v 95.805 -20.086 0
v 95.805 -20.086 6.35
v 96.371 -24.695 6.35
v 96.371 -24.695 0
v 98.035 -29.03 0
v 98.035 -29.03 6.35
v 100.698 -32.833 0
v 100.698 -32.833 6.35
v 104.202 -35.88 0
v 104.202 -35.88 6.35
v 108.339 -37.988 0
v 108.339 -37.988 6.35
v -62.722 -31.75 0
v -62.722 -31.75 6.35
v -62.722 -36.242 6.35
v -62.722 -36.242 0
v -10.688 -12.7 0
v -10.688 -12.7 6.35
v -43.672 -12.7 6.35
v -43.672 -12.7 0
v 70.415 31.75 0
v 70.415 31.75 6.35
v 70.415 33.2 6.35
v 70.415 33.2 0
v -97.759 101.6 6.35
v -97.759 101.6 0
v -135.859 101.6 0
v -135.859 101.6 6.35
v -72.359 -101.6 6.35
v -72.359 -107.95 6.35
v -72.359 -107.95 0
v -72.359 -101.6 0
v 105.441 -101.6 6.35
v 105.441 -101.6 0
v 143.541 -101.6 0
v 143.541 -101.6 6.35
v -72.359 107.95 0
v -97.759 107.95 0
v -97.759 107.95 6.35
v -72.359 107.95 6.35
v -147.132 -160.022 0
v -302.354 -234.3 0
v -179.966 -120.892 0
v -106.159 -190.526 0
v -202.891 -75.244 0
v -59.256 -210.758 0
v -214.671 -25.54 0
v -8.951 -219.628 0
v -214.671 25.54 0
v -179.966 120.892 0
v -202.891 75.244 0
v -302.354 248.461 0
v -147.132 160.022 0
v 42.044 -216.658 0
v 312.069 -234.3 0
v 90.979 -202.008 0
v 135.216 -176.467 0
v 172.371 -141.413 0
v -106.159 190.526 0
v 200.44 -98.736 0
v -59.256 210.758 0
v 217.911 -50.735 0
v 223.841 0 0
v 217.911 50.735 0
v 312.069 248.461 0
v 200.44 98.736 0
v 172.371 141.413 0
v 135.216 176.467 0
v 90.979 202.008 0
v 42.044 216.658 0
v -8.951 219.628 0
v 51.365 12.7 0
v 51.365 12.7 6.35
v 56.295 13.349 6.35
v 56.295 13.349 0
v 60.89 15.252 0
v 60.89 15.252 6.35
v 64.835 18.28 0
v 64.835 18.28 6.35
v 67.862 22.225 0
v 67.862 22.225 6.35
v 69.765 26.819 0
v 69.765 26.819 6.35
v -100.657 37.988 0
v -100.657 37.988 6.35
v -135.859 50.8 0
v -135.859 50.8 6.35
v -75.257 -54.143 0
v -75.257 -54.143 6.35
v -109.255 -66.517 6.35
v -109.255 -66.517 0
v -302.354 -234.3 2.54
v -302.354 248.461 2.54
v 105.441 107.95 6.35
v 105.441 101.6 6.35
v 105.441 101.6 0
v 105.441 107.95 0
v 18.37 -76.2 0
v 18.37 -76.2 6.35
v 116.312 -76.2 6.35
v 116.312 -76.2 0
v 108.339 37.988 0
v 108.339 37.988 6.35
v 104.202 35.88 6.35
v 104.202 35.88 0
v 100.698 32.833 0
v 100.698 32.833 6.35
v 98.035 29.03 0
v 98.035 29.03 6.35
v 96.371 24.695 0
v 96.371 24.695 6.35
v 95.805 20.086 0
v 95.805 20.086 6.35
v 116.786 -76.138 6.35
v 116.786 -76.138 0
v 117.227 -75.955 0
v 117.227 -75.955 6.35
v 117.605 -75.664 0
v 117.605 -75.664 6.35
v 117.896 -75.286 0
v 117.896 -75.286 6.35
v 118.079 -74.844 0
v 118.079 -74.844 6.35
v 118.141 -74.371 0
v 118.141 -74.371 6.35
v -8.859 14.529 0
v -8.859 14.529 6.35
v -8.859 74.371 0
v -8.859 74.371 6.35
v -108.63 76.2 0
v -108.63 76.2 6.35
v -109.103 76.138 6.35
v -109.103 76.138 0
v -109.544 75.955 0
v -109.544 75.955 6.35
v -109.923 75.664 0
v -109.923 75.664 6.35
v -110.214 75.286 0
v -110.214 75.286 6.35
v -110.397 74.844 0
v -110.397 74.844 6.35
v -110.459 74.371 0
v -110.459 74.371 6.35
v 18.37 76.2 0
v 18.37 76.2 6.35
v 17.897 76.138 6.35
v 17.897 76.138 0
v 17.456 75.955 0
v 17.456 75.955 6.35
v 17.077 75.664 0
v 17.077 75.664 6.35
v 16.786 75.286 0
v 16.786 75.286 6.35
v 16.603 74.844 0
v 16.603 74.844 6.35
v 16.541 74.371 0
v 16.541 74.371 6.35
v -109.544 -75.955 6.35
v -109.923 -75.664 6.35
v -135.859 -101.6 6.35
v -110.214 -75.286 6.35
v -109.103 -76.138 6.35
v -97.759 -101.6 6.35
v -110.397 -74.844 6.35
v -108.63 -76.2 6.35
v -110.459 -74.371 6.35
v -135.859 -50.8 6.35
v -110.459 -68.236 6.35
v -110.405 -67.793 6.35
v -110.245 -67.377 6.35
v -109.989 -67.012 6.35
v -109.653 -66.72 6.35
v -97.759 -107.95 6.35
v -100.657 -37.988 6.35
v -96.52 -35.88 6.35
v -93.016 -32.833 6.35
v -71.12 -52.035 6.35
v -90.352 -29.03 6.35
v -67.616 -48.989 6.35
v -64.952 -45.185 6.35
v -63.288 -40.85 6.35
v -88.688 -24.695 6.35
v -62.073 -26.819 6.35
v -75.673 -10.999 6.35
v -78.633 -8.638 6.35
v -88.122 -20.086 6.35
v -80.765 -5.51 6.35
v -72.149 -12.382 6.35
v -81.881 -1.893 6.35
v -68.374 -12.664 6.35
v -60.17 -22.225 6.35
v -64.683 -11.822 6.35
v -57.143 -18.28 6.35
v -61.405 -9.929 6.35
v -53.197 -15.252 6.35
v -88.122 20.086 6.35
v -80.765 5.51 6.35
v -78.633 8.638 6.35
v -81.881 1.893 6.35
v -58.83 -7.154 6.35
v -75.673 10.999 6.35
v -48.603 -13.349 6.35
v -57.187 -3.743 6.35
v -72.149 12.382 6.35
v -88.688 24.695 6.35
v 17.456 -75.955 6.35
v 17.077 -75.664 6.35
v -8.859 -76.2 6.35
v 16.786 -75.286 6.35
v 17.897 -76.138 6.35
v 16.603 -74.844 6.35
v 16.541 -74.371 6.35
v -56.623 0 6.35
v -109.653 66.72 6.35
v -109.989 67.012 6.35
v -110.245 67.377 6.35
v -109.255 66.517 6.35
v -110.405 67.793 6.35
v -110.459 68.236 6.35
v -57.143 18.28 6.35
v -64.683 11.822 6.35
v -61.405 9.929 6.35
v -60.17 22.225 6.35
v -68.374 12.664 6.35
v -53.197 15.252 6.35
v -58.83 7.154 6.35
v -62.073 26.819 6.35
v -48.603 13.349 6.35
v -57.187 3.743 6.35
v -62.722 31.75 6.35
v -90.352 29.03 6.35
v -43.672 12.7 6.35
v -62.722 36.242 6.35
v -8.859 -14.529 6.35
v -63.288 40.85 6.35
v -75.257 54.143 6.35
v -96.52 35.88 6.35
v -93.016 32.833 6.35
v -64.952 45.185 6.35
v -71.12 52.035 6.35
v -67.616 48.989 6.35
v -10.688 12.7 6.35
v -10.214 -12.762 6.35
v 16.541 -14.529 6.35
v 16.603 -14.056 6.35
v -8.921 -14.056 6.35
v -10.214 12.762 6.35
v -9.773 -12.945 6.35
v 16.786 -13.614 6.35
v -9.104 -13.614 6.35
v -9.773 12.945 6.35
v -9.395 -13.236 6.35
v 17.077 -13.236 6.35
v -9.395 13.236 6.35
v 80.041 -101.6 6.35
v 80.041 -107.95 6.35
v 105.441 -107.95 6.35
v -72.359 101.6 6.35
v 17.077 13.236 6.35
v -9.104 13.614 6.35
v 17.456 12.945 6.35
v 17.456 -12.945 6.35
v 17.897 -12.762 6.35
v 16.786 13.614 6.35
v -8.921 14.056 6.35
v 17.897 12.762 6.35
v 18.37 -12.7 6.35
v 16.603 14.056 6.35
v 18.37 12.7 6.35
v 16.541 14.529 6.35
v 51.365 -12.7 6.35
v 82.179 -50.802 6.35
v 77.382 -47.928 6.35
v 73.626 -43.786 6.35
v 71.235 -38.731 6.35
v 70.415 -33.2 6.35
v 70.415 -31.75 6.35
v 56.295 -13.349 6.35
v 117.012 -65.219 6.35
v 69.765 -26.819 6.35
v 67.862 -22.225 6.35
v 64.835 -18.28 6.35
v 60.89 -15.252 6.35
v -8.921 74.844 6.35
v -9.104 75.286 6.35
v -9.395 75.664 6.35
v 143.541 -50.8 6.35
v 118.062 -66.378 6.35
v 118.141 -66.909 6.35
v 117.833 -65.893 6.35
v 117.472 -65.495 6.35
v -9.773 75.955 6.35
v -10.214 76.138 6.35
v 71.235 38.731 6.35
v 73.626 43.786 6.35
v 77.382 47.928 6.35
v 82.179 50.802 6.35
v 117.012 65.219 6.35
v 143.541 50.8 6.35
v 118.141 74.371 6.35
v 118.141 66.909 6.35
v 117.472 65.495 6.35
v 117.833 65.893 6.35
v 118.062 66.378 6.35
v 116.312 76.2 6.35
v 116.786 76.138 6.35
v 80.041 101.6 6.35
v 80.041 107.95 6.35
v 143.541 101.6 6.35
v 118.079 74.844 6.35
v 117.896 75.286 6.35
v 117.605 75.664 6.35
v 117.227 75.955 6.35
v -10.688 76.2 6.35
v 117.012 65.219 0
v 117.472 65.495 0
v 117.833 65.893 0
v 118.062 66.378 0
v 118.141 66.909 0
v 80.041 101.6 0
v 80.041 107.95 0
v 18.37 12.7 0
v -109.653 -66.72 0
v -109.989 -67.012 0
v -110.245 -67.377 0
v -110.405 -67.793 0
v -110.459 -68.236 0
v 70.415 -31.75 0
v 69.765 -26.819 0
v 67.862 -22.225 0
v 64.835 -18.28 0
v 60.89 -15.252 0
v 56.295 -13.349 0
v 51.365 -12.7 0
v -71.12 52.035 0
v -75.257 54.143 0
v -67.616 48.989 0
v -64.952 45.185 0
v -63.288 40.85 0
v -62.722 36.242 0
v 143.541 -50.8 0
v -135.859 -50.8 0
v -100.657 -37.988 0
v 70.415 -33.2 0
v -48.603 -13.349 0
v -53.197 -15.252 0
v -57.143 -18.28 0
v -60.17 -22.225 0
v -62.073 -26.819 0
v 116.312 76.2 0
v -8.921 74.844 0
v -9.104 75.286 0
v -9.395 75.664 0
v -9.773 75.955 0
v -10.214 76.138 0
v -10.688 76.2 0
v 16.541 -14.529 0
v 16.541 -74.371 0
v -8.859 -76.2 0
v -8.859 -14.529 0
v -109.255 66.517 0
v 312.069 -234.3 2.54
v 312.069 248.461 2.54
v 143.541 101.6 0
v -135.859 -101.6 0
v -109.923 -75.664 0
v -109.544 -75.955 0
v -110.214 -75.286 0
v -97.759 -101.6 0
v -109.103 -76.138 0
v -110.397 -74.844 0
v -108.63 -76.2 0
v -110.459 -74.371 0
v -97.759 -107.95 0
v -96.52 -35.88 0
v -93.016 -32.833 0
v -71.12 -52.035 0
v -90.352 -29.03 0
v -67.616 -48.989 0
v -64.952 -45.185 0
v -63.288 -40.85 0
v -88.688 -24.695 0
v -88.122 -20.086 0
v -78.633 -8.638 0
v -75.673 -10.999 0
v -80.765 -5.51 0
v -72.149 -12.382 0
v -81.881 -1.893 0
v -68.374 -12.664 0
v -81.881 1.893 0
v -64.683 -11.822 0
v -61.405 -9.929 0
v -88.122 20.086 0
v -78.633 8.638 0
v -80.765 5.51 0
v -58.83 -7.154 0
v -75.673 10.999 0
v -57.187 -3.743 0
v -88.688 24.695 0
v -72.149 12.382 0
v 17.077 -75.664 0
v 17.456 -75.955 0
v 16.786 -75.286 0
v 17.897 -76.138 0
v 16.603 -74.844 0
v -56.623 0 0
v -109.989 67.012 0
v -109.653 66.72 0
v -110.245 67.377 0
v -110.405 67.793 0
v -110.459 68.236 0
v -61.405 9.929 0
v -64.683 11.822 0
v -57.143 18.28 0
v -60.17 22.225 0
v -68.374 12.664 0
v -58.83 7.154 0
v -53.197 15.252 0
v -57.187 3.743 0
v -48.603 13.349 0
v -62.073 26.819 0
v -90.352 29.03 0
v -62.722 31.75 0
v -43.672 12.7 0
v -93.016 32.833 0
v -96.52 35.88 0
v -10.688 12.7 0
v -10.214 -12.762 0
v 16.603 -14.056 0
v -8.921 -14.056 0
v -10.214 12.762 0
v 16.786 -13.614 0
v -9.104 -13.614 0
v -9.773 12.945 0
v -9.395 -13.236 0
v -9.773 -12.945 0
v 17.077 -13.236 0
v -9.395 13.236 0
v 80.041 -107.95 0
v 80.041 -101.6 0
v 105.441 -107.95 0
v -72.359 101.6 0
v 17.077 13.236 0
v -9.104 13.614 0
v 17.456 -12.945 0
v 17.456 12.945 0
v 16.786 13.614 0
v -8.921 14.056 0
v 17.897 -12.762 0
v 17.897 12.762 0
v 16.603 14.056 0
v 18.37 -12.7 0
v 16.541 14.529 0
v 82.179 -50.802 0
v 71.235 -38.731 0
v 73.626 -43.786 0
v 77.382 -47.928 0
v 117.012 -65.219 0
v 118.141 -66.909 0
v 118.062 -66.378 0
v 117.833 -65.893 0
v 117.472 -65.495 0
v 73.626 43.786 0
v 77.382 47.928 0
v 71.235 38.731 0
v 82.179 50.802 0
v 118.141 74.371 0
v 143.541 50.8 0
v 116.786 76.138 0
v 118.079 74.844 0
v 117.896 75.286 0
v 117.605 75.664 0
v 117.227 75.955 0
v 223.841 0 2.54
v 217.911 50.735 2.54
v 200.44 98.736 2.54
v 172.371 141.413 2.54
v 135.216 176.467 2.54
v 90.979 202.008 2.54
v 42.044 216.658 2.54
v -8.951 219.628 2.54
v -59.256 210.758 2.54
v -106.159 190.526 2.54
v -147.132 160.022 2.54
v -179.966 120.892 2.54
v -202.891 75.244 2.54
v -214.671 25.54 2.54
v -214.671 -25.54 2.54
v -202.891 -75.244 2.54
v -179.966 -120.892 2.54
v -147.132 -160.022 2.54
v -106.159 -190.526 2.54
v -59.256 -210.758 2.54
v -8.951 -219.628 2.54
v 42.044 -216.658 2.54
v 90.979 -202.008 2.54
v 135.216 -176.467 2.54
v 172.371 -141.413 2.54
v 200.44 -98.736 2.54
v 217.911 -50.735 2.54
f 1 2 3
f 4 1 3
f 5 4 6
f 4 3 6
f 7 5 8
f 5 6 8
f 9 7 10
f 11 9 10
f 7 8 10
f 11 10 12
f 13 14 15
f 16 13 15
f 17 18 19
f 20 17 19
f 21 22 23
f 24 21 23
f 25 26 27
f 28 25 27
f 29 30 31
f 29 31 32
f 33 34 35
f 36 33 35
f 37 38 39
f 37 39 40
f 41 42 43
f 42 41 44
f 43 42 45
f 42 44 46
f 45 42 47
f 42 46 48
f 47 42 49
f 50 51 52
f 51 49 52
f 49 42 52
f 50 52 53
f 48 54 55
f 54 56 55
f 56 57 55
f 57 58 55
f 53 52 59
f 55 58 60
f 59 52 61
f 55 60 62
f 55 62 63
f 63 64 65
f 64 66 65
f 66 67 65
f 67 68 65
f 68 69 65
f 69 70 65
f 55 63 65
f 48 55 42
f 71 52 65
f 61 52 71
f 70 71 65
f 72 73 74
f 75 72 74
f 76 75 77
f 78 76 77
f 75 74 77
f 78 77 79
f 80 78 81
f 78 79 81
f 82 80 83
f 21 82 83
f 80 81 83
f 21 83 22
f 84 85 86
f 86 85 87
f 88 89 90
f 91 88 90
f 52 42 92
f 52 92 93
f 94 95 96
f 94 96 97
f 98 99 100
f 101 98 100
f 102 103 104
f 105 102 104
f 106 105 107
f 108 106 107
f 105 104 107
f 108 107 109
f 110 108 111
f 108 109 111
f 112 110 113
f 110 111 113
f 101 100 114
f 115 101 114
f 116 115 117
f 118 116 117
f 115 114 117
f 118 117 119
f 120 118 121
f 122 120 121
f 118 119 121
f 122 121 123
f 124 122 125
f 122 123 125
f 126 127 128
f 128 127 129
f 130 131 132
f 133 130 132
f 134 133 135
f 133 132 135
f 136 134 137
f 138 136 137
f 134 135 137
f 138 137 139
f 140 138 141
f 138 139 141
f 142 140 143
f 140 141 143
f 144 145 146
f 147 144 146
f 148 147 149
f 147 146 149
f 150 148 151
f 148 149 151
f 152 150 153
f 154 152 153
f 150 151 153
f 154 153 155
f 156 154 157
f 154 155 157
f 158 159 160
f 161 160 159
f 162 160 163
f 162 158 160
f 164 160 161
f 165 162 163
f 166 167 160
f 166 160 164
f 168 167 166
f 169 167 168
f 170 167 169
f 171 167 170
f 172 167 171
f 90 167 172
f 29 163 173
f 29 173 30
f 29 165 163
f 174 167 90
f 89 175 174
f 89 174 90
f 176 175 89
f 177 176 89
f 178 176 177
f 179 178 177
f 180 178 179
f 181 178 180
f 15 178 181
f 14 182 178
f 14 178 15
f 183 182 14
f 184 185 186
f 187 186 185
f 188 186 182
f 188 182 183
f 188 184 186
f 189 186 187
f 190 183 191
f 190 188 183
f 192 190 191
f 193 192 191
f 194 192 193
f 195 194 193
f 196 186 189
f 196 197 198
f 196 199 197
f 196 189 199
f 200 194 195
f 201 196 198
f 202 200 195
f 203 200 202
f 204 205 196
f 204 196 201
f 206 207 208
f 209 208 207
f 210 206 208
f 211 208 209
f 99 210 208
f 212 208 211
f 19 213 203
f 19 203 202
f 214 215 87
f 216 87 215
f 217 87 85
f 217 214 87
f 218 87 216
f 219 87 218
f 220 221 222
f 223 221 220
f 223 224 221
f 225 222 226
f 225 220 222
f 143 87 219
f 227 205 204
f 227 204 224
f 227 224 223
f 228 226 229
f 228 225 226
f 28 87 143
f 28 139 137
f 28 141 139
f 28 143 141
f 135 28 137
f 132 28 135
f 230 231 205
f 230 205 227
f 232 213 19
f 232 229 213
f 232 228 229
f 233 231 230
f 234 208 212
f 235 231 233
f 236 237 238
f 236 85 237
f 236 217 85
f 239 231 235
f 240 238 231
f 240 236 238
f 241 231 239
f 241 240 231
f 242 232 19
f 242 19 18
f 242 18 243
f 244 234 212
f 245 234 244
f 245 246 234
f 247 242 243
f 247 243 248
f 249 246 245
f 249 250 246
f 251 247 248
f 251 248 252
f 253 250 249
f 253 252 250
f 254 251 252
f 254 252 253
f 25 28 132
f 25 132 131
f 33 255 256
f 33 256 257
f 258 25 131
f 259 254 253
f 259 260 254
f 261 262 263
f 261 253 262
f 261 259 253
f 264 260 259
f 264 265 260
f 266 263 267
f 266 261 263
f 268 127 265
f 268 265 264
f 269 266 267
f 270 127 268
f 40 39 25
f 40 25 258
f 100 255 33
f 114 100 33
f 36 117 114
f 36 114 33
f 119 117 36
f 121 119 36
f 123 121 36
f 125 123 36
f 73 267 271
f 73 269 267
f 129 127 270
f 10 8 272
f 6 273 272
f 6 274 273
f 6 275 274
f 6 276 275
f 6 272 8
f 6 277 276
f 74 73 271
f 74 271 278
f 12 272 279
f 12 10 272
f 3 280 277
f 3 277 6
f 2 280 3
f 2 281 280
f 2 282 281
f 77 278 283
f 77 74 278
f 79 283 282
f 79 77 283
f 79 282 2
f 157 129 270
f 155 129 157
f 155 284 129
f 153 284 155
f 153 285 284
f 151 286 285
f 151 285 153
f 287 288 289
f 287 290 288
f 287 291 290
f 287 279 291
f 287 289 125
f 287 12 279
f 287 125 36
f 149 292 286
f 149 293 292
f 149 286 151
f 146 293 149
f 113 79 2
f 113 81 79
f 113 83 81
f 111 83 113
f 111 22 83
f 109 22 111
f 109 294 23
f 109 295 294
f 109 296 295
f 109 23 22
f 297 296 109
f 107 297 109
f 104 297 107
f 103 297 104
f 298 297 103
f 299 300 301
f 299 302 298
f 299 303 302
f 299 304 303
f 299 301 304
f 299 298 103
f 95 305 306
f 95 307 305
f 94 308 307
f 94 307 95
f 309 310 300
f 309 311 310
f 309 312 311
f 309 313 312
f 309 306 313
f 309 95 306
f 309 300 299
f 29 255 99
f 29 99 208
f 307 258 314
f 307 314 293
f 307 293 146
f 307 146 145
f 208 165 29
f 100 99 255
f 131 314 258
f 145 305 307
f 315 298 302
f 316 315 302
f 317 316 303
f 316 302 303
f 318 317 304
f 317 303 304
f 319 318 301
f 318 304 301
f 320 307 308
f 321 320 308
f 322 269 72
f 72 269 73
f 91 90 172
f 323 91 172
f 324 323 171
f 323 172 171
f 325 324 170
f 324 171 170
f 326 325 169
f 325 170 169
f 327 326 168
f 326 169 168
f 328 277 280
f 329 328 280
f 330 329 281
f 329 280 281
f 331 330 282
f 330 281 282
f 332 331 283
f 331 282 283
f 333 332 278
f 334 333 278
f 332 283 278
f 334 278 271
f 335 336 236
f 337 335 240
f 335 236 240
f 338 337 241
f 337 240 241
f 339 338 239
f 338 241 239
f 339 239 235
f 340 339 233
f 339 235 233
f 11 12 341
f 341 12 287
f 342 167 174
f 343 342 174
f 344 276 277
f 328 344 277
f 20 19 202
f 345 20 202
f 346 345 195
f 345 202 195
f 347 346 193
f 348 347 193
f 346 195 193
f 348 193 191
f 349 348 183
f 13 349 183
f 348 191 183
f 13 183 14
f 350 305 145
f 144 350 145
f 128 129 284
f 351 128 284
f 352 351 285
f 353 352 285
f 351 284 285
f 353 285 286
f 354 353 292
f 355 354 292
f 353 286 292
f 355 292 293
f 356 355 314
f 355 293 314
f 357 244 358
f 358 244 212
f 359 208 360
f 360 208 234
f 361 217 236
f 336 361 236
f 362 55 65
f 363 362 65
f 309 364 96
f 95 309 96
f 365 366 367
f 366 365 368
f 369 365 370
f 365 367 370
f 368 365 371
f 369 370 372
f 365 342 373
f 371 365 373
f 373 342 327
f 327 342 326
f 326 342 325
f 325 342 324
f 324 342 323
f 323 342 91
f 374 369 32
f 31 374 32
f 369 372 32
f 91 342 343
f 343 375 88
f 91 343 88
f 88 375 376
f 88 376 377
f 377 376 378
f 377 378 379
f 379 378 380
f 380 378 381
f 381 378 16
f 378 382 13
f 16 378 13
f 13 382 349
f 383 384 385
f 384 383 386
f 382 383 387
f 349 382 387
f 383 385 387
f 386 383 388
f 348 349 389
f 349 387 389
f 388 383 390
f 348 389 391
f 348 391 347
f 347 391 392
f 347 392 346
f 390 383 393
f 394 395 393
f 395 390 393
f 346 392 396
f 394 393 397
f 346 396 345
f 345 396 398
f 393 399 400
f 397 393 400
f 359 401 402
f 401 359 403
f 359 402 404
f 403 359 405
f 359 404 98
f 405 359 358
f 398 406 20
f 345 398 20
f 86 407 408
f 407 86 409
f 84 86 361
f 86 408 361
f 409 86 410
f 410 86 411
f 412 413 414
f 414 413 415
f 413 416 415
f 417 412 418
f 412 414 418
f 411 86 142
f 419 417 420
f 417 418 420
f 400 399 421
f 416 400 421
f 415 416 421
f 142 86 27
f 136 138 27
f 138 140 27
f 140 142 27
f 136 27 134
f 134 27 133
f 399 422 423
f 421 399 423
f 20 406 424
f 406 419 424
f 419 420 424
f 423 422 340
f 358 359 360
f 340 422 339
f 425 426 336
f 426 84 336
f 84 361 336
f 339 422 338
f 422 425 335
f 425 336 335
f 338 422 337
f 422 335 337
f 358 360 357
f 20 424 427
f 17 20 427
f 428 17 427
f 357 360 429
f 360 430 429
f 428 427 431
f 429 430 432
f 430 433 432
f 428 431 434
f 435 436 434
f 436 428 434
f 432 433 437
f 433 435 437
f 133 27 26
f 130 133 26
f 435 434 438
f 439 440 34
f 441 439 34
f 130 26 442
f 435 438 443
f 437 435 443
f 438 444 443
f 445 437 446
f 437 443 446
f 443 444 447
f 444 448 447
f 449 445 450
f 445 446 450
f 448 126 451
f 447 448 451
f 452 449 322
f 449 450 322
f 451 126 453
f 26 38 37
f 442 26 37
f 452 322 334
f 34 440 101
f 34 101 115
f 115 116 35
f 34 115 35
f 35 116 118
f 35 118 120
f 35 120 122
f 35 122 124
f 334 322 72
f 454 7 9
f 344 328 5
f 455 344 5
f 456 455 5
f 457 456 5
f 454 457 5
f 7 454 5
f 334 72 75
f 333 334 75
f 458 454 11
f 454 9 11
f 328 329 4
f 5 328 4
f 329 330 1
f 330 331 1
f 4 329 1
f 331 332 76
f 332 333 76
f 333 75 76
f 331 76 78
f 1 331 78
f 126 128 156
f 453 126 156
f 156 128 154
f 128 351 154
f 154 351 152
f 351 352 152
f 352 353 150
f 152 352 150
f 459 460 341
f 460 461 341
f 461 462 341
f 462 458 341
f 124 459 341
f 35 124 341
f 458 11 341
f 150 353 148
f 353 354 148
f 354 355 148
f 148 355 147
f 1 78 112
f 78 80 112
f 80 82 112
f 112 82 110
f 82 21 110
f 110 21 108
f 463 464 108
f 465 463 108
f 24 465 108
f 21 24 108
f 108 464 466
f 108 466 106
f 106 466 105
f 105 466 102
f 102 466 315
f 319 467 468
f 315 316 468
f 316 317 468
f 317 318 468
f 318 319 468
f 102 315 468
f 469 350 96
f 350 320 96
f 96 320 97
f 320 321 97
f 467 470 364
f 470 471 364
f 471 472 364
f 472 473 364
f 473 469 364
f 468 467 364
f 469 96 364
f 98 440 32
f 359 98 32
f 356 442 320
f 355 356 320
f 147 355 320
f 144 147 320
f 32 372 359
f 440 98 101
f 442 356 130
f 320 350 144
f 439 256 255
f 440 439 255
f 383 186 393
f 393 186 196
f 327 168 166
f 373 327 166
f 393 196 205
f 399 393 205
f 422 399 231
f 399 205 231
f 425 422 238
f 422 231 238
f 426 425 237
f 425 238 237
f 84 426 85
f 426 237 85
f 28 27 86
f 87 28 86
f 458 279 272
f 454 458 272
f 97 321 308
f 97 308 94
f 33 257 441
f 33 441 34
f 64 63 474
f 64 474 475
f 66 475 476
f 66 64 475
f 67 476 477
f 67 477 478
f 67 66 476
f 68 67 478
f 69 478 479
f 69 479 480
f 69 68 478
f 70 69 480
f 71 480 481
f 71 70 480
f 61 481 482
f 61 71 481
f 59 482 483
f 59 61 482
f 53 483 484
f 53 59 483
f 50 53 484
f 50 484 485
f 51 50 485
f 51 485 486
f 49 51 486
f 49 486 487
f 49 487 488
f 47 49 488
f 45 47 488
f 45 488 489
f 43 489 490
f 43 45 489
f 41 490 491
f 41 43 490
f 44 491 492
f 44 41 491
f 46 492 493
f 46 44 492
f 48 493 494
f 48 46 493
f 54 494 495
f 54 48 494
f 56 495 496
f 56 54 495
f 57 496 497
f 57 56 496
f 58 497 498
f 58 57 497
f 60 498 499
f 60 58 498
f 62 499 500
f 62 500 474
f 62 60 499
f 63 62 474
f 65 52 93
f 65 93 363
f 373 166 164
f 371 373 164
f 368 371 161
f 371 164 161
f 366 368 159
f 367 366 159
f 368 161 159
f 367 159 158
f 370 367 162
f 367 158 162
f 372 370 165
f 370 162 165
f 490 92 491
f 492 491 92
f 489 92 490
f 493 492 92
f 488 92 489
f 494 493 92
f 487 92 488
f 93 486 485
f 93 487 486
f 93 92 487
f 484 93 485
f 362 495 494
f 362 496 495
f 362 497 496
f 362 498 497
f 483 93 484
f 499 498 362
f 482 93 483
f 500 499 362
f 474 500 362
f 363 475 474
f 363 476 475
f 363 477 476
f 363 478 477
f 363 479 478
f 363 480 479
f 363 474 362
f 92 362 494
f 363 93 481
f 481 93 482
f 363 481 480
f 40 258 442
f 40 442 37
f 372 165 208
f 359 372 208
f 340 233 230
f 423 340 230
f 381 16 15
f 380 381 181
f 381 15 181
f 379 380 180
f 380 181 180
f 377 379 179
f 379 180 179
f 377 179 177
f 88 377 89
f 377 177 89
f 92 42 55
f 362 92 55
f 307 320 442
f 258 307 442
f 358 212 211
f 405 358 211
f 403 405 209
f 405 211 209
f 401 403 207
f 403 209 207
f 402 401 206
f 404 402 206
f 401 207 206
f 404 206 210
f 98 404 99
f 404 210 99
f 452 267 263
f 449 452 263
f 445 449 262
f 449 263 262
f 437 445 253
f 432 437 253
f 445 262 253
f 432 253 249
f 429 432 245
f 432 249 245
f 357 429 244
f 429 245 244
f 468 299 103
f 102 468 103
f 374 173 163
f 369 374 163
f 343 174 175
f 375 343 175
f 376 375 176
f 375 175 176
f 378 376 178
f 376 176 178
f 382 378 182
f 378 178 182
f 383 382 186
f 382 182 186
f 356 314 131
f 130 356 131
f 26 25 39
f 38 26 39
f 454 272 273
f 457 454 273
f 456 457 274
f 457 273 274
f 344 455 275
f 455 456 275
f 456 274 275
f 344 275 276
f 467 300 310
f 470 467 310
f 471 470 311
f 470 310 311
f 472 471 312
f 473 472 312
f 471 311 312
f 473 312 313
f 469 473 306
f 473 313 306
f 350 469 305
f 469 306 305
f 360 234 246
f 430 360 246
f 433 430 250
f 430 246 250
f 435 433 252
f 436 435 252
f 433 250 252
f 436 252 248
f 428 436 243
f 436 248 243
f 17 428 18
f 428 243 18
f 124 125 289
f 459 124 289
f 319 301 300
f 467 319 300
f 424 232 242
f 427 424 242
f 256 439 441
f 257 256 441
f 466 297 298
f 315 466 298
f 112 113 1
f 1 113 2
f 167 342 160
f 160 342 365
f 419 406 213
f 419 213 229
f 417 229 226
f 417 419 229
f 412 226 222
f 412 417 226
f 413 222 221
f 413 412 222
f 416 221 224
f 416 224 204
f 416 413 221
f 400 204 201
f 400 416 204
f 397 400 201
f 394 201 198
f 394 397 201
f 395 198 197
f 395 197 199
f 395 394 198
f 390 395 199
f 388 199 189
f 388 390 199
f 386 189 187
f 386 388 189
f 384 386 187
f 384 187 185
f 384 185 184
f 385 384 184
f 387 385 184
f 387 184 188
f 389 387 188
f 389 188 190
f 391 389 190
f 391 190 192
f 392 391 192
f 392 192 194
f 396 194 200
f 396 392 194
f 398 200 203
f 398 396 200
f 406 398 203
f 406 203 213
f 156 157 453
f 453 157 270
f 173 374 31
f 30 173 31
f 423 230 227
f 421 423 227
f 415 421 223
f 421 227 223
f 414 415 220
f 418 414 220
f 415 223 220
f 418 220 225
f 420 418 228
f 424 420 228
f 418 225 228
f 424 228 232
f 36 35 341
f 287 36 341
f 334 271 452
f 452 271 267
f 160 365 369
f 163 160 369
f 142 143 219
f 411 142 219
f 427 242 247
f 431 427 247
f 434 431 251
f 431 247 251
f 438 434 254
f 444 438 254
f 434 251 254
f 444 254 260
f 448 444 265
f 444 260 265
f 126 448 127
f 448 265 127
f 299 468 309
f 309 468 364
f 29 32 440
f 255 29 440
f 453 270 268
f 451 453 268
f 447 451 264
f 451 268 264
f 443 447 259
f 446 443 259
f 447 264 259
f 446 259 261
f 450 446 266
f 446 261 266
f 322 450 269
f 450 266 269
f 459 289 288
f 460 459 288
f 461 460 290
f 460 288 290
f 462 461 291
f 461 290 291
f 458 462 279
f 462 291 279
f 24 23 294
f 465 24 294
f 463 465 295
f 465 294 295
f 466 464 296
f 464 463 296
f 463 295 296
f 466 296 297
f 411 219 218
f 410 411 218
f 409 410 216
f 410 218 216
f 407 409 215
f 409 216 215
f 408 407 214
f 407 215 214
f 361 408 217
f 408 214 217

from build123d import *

# Parameters (mm, degrees)
F1_R     = 12.7
F1_W     = 25.4
F1_H     = 6.35
F2_DEPTH = 6.35
F0_W     = 614.423186
F0_H     = 482.76107
F0_R     = 220
F3_DEPTH = 2.54
F5_DEPTH = 25.4
F7_DEPTH = 25.4


with BuildPart() as f2:
    # F1 (on face) → F2 (new body)
    with BuildSketch(Plane.XY):
        Polygon((-97.758854, 101.6), (-135.858854, 101.6), (-135.858854, 51.370811), (-88.397744, 33.267927), (-88.347766, -33.487785), (-135.858854, -51.12635), (-135.858854, -101.6), (-97.758854, -101.6), (-72.358854, -101.6), (80.041146, -101.6), (105.441146, -101.6), (143.541146, -101.6), (143.541146, -51.020265), (95.782734, -33.633832), (95.831849, 33.409029), (143.541146, 50.852332), (143.541146, 101.6), (105.441146, 101.6), (80.041146, 101.6), (-72.358854, 101.6), align=None)
        with Locations((-69.322832, 0)):
            Circle(F1_R, mode=Mode.SUBTRACT)
        with Locations((-85.058854, 104.775)):
            Rectangle(F1_W, F1_H)
        Polygon((-88.397744, 33.267927), (-135.858854, 51.370811), (-135.858854, -51.12635), (-88.347766, -33.487785), align=None)
        with Locations((92.741146, 104.775)):
            Rectangle(F1_W, F1_H)
        with Locations((-85.058854, -104.775)):
            Rectangle(F1_W, F1_H)
        Polygon((143.541146, -51.020265), (143.541146, 50.852332), (95.831849, 33.409029), (95.782734, -33.633832), align=None)
        with Locations((92.741146, -104.775)):
            Rectangle(F1_W, F1_H)
    extrude(amount=F2_DEPTH)

    # F4 (on face) → F5 (cut)
    with BuildSketch(Plane.XY.offset(6.35)):
        with BuildLine():
            Line((143.541146, -50.8), (143.541146, 50.8))
            Line((143.541146, 50.8), (108.339277, 37.987568))
            ThreePointArc((108.339277, 37.987568), (99.249914, 31.013054), (95.804761, 20.086423))
            Line((95.804761, 20.086423), (95.804761, -20.086423))
            ThreePointArc((95.804761, -20.086423), (99.249914, -31.013054), (108.339277, -37.987568))
            Line((108.339277, -37.987568), (143.541146, -50.8))
        make_face()
        with BuildLine():
            Line((-100.656985, 37.987568), (-135.858854, 50.8))
            Line((-135.858854, 50.8), (-135.858854, -50.8))
            Line((-135.858854, -50.8), (-100.656985, -37.987568))
            ThreePointArc((-100.656985, -37.987568), (-91.567623, -31.013054), (-88.122469, -20.086423))
            Line((-88.122469, -20.086423), (-88.122469, 20.086423))
            ThreePointArc((-88.122469, 20.086423), (-91.567623, 31.013054), (-100.656985, 37.987568))
        make_face()
    extrude(amount=-F5_DEPTH, mode=Mode.SUBTRACT)

    # F6 (on face) → F7 (cut)
    with BuildSketch(Plane.XY.offset(6.35)):
        with BuildLine():
            Line((-75.256985, -54.142724), (-109.255424, -66.517143))
            ThreePointArc((-109.255424, -66.517143), (-110.128087, -67.186762), (-110.458854, -68.23582))
            Line((-110.458854, -68.23582), (-110.458854, -74.371022))
            ThreePointArc((-110.458854, -74.371022), (-109.923159, -75.664305), (-108.629877, -76.2))
            Line((-108.629877, -76.2), (-8.858854, -76.2))
            Line((-8.858854, -76.2), (-8.858854, -14.528978))
            ThreePointArc((-8.858854, -14.528978), (-9.39455, -13.235695), (-10.687832, -12.7))
            Line((-10.687832, -12.7), (-43.672469, -12.7))
            ThreePointArc((-43.672469, -12.7), (-57.142853, -18.279616), (-62.722469, -31.75))
            Line((-62.722469, -31.75), (-62.722469, -36.241579))
            ThreePointArc((-62.722469, -36.241579), (-66.167623, -47.16821), (-75.256985, -54.142724))
        make_face()
        with BuildLine():
            Line((-62.722469, 36.241579), (-62.722469, 31.75))
            ThreePointArc((-62.722469, 31.75), (-57.142853, 18.279616), (-43.672469, 12.7))
            Line((-43.672469, 12.7), (-10.687832, 12.7))
            ThreePointArc((-10.687832, 12.7), (-9.39455, 13.235695), (-8.858854, 14.528978))
            Line((-8.858854, 14.528978), (-8.858854, 74.371022))
            ThreePointArc((-8.858854, 74.371022), (-9.39455, 75.664305), (-10.687832, 76.2))
            Line((-10.687832, 76.2), (-108.629877, 76.2))
            ThreePointArc((-108.629877, 76.2), (-109.923159, 75.664305), (-110.458854, 74.371022))
            Line((-110.458854, 74.371022), (-110.458854, 68.23582))
            ThreePointArc((-110.458854, 68.23582), (-110.128087, 67.186762), (-109.255424, 66.517143))
            Line((-109.255424, 66.517143), (-75.256985, 54.142724))
            ThreePointArc((-75.256985, 54.142724), (-66.167623, 47.16821), (-62.722469, 36.241579))
        make_face()
        with BuildLine():
            Line((82.179021, 50.801741), (117.011651, 65.219236))
            ThreePointArc((117.011651, 65.219236), (117.832776, 65.892847), (118.141146, 66.909167))
            Line((118.141146, 66.909167), (118.141146, 74.371029))
            ThreePointArc((118.141146, 74.371029), (117.605453, 75.664307), (116.312175, 76.2))
            Line((116.312175, 76.2), (18.370123, 76.2))
            ThreePointArc((18.370123, 76.2), (17.076841, 75.664305), (16.541146, 74.371022))
            Line((16.541146, 74.371022), (16.541146, 14.528978))
            ThreePointArc((16.541146, 14.528978), (17.076841, 13.235695), (18.370123, 12.7))
            Line((18.370123, 12.7), (51.364546, 12.7))
            ThreePointArc((51.364546, 12.7), (64.83493, 18.279616), (70.414546, 31.75))
            Line((70.414546, 31.75), (70.414546, 33.199933))
            ThreePointArc((70.414546, 33.199933), (73.626431, 43.785613), (82.179021, 50.801741))
        make_face()
        with BuildLine():
            ThreePointArc((82.179021, -50.801741), (73.626431, -43.785613), (70.414546, -33.199933))
            Line((70.414546, -33.199933), (70.414546, -31.75))
            ThreePointArc((70.414546, -31.75), (64.83493, -18.279616), (51.364546, -12.7))
            Line((51.364546, -12.7), (18.370123, -12.7))
            ThreePointArc((18.370123, -12.7), (17.076841, -13.235695), (16.541146, -14.528978))
            Line((16.541146, -14.528978), (16.541146, -74.371022))
            ThreePointArc((16.541146, -74.371022), (17.076841, -75.664305), (18.370123, -76.2))
            Line((18.370123, -76.2), (116.312168, -76.2))
            ThreePointArc((116.312168, -76.2), (117.60545, -75.664305), (118.141146, -74.371022))
            Line((118.141146, -74.371022), (118.141146, -66.909167))
            ThreePointArc((118.141146, -66.909167), (117.832776, -65.892847), (117.011651, -65.219236))
            Line((117.011651, -65.219236), (82.179021, -50.801741))
        make_face()
    extrude(amount=-F7_DEPTH, mode=Mode.SUBTRACT)


with BuildPart() as f3:
    # F0 (on Top) → F3 (new body)
    with BuildSketch(Plane.XY):
        with Locations((4.857525, 7.080205)):
            Rectangle(F0_W, F0_H)
        with Locations((3.841146, 0)):
            Circle(F0_R, mode=Mode.SUBTRACT)
    extrude(amount=F3_DEPTH)


solid = Compound([f2.part, f3.part])
